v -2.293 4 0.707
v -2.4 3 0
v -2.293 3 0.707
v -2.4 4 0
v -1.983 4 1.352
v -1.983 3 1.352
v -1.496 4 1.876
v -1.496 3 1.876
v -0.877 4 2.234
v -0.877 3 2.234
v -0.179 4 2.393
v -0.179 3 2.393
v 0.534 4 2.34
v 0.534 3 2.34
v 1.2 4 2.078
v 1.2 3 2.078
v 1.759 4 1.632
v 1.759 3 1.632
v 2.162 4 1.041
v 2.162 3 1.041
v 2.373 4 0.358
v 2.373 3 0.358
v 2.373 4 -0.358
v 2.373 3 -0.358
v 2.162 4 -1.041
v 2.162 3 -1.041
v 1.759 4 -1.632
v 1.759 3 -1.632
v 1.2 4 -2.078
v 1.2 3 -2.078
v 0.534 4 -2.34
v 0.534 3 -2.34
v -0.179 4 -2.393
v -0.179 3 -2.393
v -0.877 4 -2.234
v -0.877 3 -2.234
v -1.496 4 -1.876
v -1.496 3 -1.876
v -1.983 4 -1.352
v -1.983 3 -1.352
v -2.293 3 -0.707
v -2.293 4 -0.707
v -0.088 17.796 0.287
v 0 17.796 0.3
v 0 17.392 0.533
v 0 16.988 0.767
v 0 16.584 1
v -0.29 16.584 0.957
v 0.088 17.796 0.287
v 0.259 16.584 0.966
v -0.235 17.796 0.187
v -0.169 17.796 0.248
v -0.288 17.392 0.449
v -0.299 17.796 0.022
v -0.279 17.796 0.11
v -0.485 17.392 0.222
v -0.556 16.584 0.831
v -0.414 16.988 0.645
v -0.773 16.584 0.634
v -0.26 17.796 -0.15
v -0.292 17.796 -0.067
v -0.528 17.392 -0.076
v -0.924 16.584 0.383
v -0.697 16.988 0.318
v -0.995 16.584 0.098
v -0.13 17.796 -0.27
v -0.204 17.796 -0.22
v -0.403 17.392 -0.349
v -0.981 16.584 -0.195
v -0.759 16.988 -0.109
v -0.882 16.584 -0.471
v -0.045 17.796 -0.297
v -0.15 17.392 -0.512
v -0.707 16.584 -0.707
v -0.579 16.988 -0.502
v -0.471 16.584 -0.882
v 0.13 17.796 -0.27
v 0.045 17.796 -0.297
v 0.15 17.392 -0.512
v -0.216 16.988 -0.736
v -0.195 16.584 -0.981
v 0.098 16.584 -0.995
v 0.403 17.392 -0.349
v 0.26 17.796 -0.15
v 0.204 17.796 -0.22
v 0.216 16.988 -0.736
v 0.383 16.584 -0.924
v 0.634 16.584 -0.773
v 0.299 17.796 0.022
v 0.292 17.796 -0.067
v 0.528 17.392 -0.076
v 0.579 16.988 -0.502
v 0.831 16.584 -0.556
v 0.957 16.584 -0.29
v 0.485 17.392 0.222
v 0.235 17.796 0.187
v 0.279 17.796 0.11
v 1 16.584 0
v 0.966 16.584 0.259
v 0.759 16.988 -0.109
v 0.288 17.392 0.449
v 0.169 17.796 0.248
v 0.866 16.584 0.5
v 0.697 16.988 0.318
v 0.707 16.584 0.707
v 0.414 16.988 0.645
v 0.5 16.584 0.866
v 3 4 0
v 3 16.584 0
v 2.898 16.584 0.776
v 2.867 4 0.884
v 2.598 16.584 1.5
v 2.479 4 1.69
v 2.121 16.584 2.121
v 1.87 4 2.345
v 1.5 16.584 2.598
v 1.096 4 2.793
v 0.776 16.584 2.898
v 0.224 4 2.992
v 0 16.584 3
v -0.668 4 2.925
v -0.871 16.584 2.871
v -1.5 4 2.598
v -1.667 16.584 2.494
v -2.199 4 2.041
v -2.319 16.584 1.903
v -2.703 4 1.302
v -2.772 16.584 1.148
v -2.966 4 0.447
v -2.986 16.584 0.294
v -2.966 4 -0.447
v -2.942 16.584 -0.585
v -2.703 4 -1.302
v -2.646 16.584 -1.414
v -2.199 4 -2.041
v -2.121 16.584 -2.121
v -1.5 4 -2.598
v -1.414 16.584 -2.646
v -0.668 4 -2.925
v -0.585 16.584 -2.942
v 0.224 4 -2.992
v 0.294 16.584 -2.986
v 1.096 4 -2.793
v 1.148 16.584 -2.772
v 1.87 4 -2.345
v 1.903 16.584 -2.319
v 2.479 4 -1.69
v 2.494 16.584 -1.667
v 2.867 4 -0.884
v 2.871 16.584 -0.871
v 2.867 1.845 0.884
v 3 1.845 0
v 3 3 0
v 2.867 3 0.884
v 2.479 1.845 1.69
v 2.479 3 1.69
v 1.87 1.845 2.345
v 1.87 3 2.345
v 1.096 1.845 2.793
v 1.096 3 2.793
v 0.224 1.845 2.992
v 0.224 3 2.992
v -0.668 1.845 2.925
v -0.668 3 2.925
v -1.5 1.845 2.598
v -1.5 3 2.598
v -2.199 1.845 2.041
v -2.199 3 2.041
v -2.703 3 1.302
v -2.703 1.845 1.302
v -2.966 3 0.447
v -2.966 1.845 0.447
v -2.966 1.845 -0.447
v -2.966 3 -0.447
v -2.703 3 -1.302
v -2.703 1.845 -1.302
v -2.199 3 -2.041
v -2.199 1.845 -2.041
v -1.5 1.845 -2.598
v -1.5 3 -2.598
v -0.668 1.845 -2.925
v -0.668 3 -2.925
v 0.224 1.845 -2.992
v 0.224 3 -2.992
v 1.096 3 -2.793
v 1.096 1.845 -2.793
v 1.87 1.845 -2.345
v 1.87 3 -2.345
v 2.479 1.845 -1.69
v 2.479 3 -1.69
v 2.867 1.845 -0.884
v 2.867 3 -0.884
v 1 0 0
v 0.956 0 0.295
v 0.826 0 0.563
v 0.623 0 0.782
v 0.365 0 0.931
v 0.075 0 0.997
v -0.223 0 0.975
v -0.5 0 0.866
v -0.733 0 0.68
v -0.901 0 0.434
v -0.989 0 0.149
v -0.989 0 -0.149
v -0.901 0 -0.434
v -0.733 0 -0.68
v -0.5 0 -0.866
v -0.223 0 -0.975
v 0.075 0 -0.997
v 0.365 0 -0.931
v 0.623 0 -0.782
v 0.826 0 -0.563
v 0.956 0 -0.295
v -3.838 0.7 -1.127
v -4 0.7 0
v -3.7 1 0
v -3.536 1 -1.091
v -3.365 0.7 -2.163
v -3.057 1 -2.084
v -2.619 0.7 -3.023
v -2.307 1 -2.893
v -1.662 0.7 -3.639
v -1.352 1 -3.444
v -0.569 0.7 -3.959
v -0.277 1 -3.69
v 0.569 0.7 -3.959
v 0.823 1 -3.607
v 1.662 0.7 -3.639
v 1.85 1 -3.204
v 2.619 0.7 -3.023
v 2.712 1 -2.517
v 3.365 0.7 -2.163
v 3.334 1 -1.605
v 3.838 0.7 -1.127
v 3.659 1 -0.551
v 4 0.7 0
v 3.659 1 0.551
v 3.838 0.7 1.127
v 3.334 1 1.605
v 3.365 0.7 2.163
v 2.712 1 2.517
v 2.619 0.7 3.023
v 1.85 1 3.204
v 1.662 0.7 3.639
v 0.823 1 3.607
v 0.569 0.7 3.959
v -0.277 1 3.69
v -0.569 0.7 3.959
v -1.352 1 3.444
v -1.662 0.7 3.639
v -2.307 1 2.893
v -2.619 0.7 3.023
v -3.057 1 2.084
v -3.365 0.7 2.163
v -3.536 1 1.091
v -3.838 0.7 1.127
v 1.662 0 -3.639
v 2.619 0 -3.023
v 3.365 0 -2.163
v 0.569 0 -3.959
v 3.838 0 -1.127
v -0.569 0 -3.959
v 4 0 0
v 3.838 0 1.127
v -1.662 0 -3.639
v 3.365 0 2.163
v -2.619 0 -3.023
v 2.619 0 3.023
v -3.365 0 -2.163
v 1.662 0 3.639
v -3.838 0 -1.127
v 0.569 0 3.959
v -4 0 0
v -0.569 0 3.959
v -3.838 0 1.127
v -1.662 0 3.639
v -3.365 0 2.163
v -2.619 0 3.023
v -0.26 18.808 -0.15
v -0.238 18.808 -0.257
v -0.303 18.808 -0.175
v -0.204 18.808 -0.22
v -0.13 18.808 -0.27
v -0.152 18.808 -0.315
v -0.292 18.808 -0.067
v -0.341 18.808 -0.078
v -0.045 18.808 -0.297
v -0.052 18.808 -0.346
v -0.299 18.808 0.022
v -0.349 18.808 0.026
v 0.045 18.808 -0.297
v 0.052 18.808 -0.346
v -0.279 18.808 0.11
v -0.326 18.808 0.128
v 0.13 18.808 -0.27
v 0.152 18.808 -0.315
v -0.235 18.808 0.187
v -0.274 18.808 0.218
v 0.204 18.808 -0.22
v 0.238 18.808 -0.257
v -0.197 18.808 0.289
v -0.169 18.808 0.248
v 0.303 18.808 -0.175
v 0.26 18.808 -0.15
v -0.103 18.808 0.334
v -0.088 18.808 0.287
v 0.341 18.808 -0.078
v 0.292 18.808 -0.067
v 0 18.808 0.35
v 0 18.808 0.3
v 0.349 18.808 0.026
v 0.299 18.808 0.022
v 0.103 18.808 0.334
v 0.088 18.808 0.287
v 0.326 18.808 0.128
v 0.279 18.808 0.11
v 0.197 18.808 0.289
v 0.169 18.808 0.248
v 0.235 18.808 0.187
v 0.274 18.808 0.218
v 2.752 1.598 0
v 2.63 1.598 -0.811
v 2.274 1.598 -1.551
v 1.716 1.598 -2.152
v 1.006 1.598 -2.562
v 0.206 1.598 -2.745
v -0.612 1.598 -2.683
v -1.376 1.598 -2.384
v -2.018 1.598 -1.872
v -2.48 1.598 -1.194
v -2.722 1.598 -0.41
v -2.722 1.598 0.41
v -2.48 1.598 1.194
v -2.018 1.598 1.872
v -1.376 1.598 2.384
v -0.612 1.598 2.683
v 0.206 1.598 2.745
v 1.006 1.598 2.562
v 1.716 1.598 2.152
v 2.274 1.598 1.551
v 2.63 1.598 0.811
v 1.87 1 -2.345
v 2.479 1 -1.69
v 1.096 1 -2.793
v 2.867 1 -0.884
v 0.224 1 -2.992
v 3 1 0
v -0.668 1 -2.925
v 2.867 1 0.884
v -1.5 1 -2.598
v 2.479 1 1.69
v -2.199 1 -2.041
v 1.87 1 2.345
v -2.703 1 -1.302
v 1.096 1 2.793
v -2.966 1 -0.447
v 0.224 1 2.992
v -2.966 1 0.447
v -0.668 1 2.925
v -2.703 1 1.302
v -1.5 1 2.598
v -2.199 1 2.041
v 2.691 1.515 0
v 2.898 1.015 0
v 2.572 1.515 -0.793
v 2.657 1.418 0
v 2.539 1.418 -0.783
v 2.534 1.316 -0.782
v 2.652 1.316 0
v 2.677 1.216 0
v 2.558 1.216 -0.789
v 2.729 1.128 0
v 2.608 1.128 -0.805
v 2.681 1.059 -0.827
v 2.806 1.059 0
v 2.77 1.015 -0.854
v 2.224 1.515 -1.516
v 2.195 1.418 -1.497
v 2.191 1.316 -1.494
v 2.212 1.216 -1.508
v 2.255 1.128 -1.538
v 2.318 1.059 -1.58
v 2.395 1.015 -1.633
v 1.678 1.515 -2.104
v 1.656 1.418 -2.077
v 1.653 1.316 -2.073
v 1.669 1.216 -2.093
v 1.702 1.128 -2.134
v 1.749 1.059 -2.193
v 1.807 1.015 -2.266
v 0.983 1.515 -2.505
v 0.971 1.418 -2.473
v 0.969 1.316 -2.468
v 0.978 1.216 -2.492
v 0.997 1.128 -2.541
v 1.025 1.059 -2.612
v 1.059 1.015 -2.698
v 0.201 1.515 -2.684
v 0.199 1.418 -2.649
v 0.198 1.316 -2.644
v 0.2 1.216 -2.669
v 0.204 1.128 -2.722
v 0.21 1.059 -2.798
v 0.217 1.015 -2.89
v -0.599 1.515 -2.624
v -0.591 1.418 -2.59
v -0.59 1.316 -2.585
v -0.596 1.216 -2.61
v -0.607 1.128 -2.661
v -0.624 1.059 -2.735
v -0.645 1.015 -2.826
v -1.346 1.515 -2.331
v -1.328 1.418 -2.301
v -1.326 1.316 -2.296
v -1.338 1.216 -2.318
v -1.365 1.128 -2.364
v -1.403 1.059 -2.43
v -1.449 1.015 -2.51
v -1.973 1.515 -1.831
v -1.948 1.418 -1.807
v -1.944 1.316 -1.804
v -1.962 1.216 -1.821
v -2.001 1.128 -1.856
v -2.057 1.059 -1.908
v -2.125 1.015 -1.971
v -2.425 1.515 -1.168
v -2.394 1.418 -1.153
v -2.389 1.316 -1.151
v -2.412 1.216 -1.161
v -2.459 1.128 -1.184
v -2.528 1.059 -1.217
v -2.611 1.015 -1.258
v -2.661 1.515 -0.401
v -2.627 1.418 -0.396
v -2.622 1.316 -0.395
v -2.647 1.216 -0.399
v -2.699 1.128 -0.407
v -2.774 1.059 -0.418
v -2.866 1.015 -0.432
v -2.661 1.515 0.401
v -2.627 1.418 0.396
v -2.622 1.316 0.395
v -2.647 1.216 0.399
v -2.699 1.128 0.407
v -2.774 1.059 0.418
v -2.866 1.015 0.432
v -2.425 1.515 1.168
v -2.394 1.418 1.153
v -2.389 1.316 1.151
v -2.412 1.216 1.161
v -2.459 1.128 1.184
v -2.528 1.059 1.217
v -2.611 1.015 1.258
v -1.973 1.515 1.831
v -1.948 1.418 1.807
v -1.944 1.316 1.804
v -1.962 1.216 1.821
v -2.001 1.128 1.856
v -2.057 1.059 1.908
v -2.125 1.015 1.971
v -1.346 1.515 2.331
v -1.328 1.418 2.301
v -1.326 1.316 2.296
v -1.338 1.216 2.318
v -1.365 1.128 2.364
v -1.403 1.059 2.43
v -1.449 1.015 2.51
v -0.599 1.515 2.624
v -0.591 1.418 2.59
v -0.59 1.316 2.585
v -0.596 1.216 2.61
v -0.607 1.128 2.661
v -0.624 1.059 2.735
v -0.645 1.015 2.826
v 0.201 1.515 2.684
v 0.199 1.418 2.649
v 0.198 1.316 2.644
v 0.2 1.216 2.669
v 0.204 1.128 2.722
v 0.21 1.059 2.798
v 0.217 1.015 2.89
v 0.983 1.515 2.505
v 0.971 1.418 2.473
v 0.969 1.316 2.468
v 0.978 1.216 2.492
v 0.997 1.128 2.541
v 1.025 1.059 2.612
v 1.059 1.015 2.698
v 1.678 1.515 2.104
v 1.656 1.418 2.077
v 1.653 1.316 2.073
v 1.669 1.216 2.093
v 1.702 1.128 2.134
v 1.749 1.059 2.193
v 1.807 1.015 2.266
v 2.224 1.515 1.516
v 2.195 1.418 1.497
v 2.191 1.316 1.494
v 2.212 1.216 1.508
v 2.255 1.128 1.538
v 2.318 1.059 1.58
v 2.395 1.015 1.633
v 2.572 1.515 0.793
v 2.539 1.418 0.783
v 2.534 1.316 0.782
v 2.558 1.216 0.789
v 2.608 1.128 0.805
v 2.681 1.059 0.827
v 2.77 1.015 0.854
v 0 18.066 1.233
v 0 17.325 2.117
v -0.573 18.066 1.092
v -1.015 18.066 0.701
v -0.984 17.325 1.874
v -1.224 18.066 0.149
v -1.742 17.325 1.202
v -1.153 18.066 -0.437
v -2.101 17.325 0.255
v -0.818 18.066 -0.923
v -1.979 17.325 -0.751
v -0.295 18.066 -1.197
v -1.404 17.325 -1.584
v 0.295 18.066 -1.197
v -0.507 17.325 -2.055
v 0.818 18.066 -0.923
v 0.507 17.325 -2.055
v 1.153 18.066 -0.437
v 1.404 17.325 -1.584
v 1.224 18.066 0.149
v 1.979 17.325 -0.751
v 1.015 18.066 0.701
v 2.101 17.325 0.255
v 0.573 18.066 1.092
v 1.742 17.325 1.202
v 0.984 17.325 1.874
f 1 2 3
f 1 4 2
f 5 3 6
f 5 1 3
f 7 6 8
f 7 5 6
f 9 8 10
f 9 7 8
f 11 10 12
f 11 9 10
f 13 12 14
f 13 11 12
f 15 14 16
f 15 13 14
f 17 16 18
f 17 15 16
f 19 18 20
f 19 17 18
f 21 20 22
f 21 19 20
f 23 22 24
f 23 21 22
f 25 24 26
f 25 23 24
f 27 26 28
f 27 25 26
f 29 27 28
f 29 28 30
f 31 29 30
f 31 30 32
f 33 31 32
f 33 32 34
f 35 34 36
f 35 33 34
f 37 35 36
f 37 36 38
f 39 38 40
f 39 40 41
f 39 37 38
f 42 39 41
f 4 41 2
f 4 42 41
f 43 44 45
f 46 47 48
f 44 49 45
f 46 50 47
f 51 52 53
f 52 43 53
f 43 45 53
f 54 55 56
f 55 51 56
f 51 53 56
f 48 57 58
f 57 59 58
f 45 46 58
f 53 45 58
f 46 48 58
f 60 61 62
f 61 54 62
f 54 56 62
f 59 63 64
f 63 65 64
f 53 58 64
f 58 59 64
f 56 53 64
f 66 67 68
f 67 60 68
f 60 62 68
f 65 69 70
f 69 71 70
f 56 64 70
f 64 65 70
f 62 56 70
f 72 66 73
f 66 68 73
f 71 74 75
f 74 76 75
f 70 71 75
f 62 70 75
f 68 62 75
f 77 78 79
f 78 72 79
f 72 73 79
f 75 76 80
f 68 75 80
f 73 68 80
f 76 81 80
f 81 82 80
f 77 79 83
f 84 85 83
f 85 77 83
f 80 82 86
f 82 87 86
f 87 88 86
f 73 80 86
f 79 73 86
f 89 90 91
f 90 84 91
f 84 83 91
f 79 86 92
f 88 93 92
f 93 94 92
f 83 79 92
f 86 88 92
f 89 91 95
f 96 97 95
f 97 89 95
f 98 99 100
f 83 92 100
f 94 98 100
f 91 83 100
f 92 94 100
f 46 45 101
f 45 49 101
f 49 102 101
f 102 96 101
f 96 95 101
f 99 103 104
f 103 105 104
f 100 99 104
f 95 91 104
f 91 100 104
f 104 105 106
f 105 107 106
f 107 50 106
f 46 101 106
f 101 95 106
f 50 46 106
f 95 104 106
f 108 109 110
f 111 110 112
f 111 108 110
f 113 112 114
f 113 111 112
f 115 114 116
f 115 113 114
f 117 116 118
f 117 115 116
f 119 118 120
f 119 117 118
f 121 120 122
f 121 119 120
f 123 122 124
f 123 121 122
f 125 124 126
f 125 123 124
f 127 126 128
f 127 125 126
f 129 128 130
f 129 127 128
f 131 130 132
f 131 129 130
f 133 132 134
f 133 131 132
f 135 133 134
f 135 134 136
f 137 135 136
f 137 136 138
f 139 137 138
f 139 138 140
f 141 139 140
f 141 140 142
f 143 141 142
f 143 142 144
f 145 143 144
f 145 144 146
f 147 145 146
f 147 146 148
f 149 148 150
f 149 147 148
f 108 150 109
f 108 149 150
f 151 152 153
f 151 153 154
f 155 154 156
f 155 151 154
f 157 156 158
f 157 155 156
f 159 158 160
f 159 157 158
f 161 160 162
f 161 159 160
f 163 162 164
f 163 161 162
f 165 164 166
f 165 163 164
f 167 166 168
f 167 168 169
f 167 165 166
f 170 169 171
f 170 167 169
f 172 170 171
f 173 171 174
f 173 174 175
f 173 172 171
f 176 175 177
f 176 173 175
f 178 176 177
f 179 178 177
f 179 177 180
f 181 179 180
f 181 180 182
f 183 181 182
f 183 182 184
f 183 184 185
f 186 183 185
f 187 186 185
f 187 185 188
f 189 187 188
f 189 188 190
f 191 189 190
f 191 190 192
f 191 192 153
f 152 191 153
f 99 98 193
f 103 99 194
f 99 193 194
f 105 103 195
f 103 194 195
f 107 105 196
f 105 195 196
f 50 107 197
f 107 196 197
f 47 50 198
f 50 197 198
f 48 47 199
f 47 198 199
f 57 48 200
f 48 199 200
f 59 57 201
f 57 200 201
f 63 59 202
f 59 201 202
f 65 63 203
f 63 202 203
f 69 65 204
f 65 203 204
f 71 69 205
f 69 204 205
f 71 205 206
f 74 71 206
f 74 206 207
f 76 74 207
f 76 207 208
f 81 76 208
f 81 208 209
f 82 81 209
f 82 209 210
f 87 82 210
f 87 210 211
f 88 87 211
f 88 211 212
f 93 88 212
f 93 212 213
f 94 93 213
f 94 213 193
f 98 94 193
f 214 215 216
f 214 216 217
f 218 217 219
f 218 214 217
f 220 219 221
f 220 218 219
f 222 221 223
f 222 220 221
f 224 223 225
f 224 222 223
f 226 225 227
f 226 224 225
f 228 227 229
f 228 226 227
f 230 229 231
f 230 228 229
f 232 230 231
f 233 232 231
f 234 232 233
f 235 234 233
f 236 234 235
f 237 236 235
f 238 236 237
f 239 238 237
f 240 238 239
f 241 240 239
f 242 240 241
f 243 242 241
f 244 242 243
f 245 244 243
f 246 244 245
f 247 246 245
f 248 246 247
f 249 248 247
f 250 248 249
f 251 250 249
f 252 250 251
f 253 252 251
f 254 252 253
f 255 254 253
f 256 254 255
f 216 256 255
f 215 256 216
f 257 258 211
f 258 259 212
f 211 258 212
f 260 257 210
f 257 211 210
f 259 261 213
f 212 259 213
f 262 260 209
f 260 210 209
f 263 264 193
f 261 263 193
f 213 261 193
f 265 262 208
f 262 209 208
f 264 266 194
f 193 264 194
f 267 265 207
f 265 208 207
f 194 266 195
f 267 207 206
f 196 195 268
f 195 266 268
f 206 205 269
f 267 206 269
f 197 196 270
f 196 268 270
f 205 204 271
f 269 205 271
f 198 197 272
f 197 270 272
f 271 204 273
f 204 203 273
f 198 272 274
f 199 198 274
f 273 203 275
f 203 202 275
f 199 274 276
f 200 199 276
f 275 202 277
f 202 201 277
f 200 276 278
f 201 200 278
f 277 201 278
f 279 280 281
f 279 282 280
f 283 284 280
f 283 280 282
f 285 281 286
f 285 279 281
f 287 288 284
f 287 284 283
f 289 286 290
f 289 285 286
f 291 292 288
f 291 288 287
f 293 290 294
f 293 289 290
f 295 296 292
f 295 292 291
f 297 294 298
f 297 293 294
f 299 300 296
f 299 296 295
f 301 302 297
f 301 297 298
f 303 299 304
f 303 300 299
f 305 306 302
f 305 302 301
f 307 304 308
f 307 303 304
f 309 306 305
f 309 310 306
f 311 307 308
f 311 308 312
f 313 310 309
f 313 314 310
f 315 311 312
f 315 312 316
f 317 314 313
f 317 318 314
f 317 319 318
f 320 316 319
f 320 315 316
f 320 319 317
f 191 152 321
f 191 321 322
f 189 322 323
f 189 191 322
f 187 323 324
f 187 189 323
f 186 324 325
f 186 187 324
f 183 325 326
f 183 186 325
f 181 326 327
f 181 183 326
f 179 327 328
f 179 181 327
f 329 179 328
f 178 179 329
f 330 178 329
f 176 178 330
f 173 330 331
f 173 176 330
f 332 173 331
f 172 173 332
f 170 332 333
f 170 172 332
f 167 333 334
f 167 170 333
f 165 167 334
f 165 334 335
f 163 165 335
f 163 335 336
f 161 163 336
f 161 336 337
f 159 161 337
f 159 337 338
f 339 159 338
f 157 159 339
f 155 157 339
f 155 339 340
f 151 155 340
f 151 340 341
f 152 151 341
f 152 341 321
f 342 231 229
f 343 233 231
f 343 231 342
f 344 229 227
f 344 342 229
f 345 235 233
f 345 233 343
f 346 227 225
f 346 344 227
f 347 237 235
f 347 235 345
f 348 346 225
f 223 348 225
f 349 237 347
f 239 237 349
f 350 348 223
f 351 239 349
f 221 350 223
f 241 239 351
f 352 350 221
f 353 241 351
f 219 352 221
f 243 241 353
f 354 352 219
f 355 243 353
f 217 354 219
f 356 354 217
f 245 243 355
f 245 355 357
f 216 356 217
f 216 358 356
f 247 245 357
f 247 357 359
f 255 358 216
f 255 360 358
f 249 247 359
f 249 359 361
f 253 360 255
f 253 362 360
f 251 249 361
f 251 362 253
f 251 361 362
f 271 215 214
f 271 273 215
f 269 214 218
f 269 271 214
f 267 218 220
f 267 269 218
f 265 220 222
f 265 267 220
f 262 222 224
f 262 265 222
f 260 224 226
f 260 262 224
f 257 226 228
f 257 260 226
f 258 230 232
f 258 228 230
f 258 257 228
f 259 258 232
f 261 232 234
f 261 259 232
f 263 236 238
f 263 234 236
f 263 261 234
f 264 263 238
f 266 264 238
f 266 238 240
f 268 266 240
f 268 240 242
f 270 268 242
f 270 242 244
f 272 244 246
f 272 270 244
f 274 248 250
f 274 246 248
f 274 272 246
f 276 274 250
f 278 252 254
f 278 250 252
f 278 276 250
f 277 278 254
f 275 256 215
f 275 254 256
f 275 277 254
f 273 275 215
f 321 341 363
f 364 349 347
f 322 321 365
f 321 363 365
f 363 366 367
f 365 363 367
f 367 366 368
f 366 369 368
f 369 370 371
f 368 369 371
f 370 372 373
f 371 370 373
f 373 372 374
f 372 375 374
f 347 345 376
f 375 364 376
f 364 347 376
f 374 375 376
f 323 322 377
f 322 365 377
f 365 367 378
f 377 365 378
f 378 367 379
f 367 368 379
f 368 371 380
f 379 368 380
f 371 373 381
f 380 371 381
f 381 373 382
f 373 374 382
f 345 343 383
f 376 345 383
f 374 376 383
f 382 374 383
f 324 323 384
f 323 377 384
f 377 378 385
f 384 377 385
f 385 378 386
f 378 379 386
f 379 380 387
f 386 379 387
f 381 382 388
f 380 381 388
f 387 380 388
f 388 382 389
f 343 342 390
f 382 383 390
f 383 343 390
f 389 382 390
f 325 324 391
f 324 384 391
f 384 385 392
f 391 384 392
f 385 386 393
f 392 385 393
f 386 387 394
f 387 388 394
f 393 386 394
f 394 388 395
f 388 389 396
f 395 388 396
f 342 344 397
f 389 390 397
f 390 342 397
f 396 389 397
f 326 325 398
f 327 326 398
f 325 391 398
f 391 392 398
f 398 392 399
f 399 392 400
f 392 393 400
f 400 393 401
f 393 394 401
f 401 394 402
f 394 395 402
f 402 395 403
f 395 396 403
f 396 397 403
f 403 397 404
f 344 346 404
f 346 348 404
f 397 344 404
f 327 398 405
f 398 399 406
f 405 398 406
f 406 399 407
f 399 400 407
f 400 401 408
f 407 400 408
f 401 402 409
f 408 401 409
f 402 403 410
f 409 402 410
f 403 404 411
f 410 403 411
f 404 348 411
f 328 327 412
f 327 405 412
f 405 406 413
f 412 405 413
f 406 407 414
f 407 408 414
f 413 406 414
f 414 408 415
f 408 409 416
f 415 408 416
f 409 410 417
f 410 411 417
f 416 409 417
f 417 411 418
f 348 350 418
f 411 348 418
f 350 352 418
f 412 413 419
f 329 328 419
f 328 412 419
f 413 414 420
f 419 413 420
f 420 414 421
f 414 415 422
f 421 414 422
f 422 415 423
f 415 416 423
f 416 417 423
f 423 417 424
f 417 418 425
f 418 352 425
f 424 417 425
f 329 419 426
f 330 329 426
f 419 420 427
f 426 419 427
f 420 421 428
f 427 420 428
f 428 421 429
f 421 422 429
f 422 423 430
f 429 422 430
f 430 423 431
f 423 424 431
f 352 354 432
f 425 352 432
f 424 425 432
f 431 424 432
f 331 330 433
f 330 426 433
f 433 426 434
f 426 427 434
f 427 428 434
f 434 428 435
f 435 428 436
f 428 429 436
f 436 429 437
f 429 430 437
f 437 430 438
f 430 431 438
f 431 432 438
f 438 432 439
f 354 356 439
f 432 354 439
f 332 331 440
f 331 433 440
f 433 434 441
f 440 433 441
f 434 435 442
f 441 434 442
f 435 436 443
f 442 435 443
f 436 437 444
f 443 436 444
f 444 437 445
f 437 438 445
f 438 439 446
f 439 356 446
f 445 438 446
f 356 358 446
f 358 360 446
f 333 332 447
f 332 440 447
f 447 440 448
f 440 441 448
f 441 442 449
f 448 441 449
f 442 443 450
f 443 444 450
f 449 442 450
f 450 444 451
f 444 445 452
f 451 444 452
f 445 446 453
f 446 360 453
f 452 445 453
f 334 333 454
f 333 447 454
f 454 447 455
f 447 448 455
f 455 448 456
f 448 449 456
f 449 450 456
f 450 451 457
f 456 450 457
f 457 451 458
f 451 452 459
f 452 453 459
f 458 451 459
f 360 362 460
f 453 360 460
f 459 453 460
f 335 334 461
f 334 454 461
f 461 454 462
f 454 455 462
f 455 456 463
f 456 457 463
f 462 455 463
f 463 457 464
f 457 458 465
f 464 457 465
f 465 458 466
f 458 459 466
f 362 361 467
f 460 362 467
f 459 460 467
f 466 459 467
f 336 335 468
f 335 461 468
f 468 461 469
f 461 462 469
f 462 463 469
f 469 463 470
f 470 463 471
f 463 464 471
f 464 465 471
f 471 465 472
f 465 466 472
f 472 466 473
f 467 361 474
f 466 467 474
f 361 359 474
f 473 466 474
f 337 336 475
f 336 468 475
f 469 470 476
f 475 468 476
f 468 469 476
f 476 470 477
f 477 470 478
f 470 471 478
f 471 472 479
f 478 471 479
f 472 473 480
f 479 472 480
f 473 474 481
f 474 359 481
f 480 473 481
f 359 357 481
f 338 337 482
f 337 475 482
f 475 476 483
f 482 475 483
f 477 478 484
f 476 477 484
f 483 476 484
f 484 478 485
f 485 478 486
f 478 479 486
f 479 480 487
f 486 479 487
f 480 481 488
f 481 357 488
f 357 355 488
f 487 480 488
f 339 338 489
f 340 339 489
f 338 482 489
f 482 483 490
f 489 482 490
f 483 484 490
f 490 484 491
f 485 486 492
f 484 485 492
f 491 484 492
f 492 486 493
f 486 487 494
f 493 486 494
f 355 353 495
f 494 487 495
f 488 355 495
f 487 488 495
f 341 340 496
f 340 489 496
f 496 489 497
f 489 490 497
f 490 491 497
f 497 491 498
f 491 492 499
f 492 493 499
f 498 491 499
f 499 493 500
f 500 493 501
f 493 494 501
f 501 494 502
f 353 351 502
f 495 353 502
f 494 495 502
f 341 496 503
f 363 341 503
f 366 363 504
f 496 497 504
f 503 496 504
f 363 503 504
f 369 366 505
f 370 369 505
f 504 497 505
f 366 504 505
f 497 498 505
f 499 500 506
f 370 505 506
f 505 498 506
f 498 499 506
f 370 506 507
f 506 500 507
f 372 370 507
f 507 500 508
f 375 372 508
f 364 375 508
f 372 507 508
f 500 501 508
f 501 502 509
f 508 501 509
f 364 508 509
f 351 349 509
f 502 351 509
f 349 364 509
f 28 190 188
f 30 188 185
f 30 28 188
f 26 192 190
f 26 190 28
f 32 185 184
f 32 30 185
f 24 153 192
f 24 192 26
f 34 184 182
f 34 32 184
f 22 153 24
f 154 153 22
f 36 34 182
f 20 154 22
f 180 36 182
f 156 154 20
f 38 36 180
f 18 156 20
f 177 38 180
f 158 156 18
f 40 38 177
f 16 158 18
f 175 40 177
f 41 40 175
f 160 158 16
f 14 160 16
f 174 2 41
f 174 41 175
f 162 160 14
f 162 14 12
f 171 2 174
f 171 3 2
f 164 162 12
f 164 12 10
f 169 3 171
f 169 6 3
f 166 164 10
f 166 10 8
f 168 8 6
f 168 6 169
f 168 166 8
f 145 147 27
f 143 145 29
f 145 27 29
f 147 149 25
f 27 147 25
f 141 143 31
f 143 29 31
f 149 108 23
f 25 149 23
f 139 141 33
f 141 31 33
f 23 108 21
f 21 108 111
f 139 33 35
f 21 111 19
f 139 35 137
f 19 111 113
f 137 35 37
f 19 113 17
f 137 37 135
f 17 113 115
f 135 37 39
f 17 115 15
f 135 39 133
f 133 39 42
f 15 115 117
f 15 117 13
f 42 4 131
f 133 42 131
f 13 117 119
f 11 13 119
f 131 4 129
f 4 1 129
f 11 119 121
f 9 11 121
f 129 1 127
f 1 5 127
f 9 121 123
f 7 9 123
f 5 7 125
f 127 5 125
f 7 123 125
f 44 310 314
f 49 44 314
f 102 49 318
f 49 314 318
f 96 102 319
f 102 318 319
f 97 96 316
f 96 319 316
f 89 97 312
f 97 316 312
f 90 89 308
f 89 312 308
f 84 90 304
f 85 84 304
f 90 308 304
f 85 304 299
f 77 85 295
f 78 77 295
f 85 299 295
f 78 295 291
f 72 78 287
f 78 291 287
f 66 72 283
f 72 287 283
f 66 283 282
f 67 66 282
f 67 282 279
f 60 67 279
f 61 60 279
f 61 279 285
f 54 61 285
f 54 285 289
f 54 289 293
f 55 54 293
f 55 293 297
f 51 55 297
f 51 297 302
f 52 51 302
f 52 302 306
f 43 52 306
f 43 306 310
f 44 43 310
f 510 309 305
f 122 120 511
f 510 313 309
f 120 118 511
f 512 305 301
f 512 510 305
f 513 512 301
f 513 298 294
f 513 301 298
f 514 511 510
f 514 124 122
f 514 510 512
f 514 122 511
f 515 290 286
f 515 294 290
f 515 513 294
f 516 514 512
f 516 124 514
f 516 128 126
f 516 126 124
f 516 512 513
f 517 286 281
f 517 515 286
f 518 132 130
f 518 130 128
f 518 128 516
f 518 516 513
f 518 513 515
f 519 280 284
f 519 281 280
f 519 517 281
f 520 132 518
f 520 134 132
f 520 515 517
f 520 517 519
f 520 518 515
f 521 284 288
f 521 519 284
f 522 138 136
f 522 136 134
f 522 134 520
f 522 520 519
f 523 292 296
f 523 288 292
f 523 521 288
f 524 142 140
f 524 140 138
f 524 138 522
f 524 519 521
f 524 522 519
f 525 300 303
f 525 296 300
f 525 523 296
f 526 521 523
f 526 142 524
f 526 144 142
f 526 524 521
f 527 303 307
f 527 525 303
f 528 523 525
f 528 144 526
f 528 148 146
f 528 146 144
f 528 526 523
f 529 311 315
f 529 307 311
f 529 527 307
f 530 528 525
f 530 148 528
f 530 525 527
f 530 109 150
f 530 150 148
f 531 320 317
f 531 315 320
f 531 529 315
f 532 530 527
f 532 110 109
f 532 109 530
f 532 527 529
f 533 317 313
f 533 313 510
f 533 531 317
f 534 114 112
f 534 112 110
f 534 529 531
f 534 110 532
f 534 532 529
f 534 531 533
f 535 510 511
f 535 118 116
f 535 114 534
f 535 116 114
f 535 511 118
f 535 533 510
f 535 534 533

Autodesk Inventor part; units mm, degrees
ref_plane "XZ Plane" through (0, 0, 0) normal (0, 1, 0) x (-1, 0, 0)
sketch "Sketch1" plane through (0, 0, 0) normal (0, 1, 0) x (-1, 0, 0)
  circle A0 centre (0, 0) radius 4
  dimension "d0" = 8
extrude "Extrusion1" add sketch "Sketch1" along normal blind 1
sketch "Sketch2" plane through (0, 1, 0) normal (0, 1, 0) x (1, 0, 0)
  circle A0 centre (0, 0) radius 4 projected
  circle A1 centre (0, 0) radius 3
  dimension "d3" = 6
extrude "Extrusion2" add sketch "Sketch2" along normal blind 15.584 contours A1
sketch "Sketch3" plane through (0, 0, 0) normal (0, -1, 0) x (1, 0, 0)
  circle A0 centre (0, 0) radius 4 projected
  circle A1 centre (0, 0) radius 1
  dimension "d6" = 2
extrude "Extrusion3" cut sketch "Sketch3" against normal blind 21 contours A1
sketch "Sketch4" plane through (0, 0, 0) normal (1, 0, 0) x (0, 1, 0)
  line L0 (1, 3) -> (16.584, 3) projected
  line L1 (1, -3) -> (16.584, -3) projected
  line L2 (0, 0) -> (17, 0)
  line L3 (16.584, 3) -> (18.8915, 0.25)
  line L4 (16.584, -3) -> (16.584, 3) projected
  line L5 (16.584, 0.2) -> (18.8915, 0.2)
  line L6 (17.7964, 0.3) -> (16.584, 1)
  line L7 (0, 1) -> (16.584, 1) projected
  line L8 (16.584, 1) -> (16.584, 3)
  line L9 (18.8915, 0.25) -> (18.8915, 0.2)
  line L10 (17.7964, 0.3) -> (19.4152, 0.3)
  line L11 (18.8076, 0.3) -> (18.8076, 0.35)
  point P0 (17.8856, 0.2)
  dimension "d9" = 40
  dimension "d10" = 0.2
  dimension "d11" = 30
  dimension "d20" = 0.05
  dimension "d21" = 0.3
  dimension "d22" = 0.05
revolve "Revolution1" add sketch "Sketch4" angle 360 about axis through (0, 0, 0) along (0, 1, 0) contours L3 L11 L10 L6 L4
sketch "Sketch5" plane through (0, 0, 0) normal (0, 0, 1) x (1, 0, 0)
  circle A0 centre (3, 1.35) radius 0.35
  line L0 (4, 1) -> (-4, 1) projected
  line L1 (3, 3) -> (3, 0)
  line L2 (0, 1.1204) -> (0, 3)
  line L3 (2.7525, 1.5975) -> (3.3734, 2.2184)
  line L4 (3.3734, 2.2184) -> (3.3499, 1.3406)
  point P0 (0, 0)
  dimension "d14" = 0.7
  dimension "d19" = 45
revolve "Revolution2" cut sketch "Sketch5" angle 360 about axis through (0, 1.1204, 0) along (0, 1, 0)
chamfer "Chamfer1" distance 0.3 angle 45 1 edges at (4, 1, 0)
sketch "Sketch6" plane through (0, 0, 0) normal (0, 0, 1) x (1, 0, 0)
  line L0 (-3, 1.845) -> (-3, 16.584) projected
  line L1 (-3, 3) -> (-2.4, 3)
  line L2 (-2.4, 3) -> (-2.4, 4)
  line L3 (-2.4, 4) -> (-3, 4)
  line L4 (-3, 4) -> (-3, 3)
  line L5 (-4, 0) -> (4, 0) projected
  line L6 (0, -3.7615) -> (0, 22.5691) projected
  point P0 (0, 0)
  dimension "d23" = 0.6
  dimension "d24" = 1
  dimension "d25" = 3
revolve "Revolution3" cut sketch "Sketch6" angle 360 about axis through (0, -10, 0) along (0, 1, 0)
properties part number "nozzle0.6" material "Copper"
